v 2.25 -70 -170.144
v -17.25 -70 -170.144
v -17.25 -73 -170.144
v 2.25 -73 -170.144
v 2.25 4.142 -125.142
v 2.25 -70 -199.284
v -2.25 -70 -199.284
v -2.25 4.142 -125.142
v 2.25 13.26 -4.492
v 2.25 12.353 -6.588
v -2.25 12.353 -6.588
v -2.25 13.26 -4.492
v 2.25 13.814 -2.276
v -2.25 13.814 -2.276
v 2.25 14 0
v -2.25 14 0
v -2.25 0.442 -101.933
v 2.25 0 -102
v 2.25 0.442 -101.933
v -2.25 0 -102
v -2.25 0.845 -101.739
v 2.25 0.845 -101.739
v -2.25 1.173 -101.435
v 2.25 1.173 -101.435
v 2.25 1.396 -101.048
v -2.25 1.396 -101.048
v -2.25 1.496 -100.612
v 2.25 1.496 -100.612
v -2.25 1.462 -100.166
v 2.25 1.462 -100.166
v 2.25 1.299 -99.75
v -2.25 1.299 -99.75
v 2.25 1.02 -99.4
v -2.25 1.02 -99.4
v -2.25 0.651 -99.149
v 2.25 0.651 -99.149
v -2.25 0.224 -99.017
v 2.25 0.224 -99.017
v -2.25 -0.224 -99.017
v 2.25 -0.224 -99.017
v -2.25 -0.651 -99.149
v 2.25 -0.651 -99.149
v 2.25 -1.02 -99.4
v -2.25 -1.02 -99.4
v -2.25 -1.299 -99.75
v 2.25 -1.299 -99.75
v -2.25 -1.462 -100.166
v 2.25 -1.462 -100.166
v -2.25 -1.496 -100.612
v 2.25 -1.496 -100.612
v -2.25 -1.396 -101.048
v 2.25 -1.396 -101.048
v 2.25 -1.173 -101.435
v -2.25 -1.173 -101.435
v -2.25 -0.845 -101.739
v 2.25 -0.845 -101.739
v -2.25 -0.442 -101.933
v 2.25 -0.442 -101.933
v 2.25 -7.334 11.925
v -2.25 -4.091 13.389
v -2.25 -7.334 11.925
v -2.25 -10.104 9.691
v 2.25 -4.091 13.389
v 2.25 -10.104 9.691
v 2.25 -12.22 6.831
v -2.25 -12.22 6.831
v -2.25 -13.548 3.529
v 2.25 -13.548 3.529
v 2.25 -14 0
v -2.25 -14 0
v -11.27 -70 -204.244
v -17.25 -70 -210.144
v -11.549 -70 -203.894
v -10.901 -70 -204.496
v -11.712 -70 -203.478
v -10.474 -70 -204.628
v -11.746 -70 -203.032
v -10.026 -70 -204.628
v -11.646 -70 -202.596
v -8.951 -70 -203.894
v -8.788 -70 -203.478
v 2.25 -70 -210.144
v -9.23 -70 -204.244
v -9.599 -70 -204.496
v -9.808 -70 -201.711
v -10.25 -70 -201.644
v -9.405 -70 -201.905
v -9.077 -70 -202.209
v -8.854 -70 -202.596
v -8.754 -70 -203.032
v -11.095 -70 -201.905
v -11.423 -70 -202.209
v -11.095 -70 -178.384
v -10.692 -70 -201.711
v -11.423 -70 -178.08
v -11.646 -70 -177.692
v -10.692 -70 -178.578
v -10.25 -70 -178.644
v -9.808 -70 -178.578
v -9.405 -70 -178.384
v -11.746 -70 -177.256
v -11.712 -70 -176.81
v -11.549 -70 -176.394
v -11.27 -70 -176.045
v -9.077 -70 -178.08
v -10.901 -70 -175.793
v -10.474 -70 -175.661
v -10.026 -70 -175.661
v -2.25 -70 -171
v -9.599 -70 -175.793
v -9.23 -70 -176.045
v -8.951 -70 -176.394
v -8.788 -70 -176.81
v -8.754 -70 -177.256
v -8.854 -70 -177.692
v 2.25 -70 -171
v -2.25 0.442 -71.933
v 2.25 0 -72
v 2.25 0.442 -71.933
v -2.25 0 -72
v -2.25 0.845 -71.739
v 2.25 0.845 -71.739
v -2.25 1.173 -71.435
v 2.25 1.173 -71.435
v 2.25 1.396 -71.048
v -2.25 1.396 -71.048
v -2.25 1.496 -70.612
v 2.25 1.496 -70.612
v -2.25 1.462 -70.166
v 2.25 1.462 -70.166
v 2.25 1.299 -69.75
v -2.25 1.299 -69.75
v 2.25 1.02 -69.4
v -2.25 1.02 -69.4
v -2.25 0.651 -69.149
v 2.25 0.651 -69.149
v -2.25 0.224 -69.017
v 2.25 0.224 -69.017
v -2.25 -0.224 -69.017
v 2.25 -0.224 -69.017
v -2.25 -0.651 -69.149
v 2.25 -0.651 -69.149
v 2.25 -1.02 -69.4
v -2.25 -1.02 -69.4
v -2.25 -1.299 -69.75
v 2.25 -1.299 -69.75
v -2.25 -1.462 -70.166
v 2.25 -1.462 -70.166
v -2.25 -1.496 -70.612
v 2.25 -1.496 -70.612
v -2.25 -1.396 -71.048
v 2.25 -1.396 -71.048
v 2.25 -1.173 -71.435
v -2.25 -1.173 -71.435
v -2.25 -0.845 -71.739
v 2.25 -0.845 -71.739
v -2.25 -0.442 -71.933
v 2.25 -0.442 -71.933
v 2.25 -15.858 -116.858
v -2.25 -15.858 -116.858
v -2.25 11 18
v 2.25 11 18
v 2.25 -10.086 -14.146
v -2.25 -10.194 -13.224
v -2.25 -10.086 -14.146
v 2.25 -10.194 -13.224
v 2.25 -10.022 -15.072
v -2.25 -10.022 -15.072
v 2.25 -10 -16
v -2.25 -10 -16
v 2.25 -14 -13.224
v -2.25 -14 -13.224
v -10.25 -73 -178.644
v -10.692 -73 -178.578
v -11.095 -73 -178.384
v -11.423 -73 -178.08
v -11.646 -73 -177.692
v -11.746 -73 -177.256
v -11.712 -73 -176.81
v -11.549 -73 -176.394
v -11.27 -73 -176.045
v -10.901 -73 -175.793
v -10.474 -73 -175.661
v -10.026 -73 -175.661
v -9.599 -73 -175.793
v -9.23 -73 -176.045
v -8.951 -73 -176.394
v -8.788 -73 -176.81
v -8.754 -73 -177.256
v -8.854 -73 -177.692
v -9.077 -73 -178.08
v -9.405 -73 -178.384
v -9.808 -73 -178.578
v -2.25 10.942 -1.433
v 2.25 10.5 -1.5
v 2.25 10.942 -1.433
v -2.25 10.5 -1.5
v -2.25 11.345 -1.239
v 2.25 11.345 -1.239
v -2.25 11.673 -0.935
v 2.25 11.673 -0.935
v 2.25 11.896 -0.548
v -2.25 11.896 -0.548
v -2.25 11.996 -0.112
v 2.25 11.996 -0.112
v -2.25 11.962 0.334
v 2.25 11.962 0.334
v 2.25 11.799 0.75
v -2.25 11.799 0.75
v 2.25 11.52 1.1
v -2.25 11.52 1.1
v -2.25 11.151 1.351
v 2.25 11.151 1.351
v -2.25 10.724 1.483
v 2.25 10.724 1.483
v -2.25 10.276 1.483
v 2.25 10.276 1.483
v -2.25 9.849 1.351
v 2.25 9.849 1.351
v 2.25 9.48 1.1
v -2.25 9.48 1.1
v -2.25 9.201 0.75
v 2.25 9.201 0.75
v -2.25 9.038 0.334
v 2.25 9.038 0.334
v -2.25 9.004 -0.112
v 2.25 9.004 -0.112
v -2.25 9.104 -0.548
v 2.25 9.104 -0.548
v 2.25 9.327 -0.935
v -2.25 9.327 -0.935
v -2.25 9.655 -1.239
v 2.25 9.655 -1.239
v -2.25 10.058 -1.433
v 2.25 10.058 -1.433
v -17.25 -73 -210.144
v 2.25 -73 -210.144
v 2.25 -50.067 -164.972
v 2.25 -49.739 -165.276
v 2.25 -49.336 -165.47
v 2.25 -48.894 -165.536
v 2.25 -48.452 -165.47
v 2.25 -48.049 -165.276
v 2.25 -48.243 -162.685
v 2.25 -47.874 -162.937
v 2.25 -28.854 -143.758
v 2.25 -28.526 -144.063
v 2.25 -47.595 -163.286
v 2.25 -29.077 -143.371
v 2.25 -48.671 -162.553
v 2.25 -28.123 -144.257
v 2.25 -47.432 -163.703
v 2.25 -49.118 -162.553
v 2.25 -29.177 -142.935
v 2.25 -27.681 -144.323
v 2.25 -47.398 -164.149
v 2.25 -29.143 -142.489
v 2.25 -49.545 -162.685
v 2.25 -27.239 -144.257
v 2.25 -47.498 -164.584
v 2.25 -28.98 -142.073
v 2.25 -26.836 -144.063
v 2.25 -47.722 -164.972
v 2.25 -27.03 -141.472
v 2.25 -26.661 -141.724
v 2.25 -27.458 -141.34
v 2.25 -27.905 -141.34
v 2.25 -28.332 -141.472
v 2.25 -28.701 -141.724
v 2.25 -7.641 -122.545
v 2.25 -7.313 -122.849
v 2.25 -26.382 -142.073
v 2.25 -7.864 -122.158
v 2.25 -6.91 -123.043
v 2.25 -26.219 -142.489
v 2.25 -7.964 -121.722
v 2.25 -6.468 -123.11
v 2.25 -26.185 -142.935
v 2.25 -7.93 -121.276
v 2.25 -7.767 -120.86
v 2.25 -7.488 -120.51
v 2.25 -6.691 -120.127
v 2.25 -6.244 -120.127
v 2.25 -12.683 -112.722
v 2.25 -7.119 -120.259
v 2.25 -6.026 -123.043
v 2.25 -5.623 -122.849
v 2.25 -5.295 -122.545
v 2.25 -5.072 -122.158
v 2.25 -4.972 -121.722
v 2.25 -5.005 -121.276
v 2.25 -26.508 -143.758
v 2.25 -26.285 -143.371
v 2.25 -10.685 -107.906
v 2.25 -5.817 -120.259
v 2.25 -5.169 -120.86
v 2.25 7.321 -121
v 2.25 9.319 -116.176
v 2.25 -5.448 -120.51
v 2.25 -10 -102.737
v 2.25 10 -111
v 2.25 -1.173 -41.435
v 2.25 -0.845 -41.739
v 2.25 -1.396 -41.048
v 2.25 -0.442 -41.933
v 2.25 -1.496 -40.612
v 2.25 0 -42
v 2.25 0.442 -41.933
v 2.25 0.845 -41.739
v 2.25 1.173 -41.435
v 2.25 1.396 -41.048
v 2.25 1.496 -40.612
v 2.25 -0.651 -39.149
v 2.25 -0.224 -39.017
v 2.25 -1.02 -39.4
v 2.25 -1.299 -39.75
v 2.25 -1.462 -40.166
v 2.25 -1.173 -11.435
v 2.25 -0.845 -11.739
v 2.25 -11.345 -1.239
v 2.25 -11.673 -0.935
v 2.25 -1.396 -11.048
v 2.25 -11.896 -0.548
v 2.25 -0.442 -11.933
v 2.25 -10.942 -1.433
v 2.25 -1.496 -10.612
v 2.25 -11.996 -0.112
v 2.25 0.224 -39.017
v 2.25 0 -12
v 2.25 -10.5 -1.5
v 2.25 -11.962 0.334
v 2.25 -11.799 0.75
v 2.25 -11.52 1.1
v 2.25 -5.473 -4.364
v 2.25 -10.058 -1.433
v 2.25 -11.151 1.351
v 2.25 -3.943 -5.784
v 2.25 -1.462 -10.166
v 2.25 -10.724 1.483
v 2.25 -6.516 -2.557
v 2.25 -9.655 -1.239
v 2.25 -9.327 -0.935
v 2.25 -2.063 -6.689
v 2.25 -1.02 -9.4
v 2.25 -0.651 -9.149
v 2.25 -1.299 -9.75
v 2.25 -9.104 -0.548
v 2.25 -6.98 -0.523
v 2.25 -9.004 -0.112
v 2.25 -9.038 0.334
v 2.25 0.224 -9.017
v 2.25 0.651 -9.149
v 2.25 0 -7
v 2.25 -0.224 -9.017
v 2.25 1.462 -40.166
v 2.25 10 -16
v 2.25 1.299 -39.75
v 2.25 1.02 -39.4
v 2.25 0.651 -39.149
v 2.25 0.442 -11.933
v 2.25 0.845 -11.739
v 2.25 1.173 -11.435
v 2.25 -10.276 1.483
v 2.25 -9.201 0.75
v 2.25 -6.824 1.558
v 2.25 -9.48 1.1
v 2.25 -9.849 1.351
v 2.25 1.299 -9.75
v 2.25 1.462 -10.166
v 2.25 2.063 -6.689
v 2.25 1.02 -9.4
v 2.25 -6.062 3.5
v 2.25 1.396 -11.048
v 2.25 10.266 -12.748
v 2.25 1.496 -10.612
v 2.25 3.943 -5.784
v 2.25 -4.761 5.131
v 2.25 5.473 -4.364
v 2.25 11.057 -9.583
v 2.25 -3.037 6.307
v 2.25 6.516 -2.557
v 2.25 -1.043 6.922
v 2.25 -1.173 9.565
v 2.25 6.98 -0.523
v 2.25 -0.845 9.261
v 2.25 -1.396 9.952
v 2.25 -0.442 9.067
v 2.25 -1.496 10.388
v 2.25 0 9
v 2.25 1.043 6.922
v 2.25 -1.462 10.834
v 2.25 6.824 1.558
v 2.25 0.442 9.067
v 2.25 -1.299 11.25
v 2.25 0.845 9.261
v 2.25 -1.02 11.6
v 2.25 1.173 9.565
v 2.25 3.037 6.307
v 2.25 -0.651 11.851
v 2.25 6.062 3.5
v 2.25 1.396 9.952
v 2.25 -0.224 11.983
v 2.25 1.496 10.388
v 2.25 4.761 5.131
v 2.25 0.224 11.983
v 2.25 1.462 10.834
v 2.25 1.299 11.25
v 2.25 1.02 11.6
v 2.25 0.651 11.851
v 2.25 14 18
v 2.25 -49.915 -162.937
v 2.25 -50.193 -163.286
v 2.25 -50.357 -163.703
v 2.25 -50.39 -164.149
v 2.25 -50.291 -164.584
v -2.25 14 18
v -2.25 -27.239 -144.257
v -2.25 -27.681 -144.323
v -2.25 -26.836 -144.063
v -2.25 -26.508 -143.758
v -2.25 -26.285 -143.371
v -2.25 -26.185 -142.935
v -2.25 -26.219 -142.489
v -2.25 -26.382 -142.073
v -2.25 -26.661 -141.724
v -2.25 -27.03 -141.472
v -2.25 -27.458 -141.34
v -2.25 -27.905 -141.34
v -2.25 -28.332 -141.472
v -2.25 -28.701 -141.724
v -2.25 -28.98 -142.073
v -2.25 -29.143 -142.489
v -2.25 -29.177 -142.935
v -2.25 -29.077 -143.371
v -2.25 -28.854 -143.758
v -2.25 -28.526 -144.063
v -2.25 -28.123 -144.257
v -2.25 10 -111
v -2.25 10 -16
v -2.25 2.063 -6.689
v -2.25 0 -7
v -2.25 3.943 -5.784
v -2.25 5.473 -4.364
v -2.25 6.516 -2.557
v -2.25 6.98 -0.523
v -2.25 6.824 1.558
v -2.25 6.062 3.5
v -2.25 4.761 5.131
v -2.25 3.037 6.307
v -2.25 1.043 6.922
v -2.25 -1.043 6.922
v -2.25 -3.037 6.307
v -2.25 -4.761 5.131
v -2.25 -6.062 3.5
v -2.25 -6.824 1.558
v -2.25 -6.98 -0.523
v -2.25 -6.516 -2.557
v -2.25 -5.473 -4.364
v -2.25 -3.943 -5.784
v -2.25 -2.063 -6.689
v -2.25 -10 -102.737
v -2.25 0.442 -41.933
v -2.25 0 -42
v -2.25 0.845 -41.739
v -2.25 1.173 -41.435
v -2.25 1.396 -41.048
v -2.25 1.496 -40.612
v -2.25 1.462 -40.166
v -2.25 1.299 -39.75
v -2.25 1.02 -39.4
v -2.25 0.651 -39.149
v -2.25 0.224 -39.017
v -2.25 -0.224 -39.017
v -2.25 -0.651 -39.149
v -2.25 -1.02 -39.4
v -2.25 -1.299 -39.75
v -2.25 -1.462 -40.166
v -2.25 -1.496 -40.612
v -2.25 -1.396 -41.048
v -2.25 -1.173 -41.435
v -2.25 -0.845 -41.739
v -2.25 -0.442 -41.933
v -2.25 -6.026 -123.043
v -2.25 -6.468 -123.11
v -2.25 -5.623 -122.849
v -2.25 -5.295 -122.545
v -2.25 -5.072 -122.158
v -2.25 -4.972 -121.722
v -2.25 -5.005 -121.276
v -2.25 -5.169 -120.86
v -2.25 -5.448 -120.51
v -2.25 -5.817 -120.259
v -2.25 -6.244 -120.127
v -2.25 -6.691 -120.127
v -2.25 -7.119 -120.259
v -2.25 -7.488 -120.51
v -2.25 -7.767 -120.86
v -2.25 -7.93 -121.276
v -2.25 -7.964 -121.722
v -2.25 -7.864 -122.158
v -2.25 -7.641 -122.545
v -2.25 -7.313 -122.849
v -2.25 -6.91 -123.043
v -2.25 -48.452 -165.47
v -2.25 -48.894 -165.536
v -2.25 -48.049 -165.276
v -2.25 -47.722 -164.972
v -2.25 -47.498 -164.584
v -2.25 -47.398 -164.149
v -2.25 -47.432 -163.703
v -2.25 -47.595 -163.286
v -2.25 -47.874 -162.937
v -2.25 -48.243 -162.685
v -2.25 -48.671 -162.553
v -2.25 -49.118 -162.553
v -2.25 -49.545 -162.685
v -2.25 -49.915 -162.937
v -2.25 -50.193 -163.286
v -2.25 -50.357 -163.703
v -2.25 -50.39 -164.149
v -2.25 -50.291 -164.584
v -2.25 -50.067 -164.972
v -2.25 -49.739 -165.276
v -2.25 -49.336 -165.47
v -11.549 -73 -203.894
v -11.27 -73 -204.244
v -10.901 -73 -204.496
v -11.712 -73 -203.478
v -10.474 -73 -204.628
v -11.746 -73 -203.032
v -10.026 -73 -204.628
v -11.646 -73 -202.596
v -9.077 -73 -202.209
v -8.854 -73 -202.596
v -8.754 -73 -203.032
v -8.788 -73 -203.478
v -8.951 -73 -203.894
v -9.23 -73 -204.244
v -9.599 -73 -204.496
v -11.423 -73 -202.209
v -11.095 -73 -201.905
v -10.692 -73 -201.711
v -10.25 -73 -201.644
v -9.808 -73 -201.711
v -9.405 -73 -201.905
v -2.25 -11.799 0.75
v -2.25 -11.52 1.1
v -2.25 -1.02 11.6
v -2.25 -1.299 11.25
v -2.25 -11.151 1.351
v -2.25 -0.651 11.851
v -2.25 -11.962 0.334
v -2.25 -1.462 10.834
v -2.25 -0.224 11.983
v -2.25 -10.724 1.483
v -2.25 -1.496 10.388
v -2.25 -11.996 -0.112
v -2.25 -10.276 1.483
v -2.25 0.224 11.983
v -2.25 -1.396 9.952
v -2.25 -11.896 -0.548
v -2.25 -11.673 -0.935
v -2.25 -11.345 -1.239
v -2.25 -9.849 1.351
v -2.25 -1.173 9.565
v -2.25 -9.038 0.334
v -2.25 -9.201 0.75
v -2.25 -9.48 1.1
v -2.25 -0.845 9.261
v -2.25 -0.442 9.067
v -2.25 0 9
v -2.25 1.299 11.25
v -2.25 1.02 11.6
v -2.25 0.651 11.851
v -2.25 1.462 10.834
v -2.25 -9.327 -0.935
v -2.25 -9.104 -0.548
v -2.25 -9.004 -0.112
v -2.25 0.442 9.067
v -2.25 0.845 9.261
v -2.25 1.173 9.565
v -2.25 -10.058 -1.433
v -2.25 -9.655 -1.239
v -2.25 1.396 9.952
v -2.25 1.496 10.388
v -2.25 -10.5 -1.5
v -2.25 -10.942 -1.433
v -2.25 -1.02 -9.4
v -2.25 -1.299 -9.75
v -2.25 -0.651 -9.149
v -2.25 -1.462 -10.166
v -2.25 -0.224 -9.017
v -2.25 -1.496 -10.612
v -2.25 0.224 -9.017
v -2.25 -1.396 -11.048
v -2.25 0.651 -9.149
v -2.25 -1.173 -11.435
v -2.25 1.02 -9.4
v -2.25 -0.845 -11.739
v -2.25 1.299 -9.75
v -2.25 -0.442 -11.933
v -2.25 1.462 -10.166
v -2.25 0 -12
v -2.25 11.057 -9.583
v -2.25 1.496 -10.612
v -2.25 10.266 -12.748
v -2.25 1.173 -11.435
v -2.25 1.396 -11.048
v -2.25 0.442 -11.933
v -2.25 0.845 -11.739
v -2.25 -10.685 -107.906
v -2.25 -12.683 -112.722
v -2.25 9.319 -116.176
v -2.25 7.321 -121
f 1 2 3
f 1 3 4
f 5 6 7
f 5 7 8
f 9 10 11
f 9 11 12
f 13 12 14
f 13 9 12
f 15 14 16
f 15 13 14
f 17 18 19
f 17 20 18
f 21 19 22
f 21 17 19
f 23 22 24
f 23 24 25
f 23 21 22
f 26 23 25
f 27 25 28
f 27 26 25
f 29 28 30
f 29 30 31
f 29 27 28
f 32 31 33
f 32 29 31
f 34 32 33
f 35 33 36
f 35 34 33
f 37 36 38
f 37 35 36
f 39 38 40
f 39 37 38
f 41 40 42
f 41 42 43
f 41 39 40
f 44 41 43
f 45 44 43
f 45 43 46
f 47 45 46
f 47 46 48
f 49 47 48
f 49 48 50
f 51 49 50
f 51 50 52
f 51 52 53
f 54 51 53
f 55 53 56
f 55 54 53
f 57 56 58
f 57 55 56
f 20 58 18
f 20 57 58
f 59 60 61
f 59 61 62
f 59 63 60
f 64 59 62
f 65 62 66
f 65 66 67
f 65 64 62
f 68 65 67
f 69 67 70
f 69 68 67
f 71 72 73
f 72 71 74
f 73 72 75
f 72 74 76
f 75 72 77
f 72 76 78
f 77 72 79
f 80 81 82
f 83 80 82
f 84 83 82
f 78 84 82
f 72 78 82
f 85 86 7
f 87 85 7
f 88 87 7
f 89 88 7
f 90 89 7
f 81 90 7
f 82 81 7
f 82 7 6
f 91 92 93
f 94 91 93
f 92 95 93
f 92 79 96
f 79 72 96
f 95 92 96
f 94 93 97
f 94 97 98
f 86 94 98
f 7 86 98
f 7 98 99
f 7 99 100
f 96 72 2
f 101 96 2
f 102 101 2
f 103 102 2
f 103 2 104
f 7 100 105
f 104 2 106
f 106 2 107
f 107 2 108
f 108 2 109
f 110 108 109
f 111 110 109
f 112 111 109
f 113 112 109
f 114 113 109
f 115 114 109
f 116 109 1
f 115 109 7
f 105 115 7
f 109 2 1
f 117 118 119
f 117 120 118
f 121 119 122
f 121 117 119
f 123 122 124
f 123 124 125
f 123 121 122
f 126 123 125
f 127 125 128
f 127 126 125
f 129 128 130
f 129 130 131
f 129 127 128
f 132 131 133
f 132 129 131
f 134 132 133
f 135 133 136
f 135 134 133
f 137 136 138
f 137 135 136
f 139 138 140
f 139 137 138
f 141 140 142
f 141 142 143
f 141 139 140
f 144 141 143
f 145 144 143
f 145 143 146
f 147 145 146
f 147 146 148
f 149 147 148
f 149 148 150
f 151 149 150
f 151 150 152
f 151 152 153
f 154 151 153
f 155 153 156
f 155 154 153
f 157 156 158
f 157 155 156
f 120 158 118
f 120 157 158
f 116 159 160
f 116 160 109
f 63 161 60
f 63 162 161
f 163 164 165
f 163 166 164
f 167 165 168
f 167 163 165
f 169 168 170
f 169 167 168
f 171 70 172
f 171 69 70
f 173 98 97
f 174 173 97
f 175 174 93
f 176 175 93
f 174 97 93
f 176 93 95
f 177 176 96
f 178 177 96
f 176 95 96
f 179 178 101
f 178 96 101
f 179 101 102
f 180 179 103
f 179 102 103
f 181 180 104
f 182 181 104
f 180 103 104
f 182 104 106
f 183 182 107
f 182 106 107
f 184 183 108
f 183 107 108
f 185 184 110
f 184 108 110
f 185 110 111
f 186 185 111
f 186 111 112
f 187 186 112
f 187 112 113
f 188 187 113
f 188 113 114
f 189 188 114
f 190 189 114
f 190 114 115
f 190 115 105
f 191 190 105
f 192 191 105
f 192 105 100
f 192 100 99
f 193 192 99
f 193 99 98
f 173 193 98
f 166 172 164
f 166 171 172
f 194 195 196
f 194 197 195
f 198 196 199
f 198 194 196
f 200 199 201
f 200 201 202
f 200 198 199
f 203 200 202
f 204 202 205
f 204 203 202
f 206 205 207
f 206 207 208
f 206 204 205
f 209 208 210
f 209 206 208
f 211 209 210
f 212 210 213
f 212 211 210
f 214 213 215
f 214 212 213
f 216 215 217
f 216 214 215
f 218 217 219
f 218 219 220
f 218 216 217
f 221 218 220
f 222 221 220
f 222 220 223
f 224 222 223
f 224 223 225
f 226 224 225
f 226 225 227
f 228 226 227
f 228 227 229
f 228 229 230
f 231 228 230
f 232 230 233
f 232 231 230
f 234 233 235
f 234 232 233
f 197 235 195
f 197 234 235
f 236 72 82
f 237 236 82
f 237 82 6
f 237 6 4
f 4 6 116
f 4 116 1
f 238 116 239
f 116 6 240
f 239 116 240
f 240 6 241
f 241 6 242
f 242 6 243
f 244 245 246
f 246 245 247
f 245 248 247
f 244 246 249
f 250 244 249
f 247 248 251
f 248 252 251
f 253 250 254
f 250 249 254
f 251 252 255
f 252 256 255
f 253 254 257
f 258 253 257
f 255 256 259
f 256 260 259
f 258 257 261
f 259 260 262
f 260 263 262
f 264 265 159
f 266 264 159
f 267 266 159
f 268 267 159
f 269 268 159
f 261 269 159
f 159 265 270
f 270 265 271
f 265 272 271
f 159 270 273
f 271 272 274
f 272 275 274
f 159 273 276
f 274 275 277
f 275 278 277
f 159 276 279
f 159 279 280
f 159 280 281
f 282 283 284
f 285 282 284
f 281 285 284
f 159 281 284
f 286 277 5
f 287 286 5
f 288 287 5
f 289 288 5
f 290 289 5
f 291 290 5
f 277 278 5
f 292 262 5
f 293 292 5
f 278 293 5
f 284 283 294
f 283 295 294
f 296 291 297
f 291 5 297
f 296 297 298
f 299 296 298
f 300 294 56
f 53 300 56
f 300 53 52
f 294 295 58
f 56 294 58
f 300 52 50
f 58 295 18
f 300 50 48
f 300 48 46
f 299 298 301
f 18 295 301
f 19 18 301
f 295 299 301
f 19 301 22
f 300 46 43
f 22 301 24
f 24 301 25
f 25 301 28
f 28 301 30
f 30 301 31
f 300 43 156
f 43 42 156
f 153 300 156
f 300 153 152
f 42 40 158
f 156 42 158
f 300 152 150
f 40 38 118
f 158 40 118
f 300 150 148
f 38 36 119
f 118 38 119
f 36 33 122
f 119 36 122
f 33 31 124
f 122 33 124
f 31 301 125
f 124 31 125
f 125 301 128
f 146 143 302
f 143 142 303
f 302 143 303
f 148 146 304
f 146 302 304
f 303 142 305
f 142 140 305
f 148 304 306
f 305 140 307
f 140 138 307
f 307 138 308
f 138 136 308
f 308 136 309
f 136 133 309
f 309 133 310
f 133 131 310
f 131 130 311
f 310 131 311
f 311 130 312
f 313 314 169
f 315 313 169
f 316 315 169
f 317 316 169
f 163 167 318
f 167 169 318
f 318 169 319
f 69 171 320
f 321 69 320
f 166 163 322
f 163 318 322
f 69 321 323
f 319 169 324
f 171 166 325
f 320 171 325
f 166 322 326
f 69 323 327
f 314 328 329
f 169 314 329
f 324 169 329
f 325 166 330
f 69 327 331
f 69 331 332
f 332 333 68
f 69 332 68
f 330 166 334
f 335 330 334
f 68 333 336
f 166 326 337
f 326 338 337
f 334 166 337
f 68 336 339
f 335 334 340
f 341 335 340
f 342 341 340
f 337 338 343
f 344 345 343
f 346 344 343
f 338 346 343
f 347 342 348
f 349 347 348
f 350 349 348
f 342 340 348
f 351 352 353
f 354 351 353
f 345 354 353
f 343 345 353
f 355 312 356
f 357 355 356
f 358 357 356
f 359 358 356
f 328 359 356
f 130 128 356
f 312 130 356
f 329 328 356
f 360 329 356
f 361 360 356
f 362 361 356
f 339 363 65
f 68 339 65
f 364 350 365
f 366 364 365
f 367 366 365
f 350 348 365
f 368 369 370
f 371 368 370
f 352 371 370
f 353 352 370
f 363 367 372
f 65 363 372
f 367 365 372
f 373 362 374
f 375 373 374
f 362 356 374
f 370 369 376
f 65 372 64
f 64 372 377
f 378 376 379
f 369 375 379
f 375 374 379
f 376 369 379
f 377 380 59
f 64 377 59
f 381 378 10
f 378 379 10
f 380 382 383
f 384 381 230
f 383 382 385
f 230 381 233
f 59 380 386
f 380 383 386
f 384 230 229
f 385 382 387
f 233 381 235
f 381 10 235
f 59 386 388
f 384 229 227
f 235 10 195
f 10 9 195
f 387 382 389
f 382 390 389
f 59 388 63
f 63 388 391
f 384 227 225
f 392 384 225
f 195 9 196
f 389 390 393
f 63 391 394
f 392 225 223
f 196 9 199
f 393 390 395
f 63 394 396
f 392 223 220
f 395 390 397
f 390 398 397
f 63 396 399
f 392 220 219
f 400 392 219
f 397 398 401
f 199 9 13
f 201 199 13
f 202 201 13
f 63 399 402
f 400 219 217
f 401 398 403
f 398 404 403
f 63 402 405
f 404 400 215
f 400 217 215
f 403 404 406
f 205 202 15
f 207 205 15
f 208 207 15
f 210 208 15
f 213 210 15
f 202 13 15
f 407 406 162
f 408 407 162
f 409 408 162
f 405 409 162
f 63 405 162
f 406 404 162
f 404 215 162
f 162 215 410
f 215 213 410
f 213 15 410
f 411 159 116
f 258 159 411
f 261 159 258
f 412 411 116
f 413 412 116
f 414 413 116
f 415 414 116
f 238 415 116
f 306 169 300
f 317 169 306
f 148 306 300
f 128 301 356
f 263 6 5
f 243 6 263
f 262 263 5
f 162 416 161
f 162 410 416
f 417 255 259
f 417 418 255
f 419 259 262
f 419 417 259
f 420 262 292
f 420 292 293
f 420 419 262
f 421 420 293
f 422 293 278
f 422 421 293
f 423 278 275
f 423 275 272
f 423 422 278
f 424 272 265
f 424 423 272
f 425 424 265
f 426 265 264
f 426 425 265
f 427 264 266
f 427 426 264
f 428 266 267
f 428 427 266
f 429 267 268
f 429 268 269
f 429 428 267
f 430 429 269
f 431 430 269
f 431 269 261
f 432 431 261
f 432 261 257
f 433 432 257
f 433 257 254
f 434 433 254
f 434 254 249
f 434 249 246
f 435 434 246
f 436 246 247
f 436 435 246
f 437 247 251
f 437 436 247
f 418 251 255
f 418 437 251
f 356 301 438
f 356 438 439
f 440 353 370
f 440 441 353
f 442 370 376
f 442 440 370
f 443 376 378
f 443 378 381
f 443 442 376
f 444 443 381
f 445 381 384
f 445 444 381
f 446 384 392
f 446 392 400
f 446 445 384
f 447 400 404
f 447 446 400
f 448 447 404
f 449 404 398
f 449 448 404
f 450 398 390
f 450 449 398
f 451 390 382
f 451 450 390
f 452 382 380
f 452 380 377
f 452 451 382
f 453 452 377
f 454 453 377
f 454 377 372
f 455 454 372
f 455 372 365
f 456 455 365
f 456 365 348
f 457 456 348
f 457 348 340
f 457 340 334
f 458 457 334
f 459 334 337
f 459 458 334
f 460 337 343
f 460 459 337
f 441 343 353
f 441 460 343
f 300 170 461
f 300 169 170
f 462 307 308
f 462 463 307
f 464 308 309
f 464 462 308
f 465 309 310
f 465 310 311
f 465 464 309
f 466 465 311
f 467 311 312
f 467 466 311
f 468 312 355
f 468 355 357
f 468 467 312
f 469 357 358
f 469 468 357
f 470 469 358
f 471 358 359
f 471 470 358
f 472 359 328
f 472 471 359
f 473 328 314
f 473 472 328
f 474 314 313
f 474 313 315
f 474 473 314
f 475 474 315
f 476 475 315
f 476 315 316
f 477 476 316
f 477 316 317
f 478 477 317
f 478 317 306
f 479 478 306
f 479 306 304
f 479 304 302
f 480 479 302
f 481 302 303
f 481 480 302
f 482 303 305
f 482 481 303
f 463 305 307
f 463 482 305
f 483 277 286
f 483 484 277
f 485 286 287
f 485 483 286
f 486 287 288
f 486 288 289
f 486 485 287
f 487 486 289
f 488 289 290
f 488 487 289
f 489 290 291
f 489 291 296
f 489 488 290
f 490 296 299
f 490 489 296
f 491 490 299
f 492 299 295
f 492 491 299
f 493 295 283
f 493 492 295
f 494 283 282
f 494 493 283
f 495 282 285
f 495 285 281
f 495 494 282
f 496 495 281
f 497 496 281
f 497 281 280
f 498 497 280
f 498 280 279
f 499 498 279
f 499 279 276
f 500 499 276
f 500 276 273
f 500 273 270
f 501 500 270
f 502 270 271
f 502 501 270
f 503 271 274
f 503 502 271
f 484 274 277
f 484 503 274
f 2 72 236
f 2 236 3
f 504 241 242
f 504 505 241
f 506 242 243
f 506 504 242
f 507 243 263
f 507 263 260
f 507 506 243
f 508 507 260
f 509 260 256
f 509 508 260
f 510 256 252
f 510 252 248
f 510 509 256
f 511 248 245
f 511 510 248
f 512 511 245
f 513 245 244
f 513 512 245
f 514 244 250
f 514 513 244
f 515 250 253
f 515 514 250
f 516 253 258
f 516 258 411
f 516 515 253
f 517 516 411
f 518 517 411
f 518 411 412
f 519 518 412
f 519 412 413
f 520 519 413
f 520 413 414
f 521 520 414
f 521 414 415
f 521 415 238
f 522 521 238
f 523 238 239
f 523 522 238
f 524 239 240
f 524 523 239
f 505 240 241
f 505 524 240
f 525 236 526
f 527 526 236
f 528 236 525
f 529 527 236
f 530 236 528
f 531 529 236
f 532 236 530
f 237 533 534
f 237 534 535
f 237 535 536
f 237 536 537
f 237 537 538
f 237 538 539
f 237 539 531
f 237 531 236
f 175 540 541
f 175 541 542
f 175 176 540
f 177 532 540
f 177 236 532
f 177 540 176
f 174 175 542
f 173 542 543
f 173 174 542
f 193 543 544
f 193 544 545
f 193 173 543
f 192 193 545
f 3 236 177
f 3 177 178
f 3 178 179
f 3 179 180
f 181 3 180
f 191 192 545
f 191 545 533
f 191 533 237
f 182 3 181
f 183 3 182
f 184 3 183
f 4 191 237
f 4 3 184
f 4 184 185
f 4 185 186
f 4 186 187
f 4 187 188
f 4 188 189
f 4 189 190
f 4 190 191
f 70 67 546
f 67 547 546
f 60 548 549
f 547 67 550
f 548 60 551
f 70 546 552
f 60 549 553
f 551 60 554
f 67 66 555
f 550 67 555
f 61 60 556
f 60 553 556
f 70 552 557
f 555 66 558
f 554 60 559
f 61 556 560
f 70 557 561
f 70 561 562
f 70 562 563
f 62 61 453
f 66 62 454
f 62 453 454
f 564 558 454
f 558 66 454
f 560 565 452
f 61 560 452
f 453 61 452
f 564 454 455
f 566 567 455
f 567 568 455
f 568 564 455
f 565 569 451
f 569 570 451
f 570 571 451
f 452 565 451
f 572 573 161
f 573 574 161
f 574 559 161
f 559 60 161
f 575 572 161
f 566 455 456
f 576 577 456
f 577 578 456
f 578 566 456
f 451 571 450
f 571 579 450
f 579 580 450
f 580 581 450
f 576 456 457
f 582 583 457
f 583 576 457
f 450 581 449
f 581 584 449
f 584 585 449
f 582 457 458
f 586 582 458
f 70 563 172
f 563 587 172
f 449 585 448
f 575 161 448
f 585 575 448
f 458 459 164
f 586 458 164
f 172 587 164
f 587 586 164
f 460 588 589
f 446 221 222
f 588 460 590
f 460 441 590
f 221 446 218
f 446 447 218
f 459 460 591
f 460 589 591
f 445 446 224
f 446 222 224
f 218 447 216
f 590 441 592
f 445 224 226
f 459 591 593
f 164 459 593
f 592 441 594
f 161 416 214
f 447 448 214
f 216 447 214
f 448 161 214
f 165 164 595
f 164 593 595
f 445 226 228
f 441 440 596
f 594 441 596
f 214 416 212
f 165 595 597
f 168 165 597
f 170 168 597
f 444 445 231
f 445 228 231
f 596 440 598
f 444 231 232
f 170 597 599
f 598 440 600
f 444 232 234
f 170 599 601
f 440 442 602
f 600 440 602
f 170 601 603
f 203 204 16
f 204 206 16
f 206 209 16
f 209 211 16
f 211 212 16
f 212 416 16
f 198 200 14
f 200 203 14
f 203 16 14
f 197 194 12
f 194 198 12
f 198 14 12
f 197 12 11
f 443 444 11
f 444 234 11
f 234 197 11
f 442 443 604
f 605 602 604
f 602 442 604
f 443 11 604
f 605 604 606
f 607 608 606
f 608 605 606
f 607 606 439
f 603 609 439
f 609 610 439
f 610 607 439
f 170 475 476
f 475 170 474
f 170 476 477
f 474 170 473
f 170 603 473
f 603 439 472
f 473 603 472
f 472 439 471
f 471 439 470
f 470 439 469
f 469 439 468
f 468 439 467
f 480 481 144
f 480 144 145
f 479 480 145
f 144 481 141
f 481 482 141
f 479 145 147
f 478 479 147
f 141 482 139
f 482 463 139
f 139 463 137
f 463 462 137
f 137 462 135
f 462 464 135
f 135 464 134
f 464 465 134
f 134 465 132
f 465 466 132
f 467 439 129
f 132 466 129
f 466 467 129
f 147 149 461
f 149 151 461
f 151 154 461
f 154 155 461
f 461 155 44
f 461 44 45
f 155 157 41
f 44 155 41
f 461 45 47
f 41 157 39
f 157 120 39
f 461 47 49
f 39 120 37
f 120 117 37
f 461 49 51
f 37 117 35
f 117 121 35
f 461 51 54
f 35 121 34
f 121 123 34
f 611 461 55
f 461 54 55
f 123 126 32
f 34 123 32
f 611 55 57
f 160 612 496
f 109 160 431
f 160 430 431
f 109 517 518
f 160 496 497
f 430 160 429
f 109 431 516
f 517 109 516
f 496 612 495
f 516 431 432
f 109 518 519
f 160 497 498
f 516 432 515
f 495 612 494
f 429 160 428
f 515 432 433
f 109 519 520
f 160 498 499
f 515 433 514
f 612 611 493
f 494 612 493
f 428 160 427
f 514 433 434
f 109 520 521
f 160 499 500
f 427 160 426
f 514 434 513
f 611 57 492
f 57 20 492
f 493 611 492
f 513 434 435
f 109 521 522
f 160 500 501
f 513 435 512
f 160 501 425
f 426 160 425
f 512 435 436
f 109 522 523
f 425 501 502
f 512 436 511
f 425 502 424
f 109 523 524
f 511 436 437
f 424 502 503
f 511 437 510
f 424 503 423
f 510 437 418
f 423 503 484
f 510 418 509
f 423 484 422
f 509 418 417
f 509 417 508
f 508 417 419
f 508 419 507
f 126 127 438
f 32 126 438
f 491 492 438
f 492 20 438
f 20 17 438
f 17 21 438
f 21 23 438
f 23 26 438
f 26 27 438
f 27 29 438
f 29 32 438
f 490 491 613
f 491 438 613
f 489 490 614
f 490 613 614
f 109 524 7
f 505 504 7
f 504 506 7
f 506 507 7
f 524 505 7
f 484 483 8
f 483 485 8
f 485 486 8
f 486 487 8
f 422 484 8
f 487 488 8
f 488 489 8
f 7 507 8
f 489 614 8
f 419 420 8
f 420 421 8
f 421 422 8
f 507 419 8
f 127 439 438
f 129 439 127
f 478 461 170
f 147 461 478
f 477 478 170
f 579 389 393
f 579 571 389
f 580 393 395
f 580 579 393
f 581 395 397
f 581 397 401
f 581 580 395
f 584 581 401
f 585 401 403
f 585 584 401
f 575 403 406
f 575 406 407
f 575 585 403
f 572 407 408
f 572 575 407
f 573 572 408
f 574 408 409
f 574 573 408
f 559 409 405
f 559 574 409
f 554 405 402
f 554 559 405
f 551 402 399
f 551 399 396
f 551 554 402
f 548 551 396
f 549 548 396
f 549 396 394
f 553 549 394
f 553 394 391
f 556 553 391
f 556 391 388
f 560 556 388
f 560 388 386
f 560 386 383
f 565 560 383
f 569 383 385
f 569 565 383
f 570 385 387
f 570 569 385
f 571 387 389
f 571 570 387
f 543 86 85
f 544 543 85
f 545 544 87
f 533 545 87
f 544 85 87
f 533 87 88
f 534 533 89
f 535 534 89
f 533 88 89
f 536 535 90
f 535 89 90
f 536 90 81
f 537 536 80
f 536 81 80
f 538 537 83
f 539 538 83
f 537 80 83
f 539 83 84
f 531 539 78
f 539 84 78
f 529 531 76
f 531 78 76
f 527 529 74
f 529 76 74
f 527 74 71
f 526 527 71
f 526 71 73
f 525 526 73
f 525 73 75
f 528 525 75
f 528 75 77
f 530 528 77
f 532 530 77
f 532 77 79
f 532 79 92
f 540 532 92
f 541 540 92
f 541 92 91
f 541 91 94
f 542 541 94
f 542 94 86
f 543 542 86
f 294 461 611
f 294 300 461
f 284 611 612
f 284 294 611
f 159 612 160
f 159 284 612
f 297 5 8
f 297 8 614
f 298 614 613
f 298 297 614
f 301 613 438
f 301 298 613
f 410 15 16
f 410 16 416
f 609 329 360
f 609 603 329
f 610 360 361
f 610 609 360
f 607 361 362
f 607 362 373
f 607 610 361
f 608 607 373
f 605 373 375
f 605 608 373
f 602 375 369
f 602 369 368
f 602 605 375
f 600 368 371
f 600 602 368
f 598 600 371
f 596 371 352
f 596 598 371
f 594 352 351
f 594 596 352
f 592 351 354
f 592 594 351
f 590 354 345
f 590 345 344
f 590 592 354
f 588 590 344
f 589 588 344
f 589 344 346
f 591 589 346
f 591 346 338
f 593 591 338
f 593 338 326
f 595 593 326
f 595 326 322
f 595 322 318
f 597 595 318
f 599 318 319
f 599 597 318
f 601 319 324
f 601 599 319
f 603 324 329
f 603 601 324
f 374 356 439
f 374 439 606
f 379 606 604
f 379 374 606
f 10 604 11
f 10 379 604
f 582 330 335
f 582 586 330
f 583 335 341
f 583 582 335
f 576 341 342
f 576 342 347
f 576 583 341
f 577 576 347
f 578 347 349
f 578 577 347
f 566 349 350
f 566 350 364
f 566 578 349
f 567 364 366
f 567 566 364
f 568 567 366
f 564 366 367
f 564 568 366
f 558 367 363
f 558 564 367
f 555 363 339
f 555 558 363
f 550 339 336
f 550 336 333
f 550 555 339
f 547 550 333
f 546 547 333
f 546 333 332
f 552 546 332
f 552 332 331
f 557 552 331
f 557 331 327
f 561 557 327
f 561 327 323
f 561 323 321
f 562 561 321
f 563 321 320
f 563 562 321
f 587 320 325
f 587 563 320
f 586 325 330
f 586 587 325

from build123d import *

# Parameters (mm, degrees)
SKETCH_1_R          = 1.5
SKETCH_1_R_2        = 7
EXTRUDE_1_DEPTH     = 2.25
SKETCH_3_W          = 19.5
SKETCH_3_H          = 40
EXTRUDE_2_DEPTH     = 3
SKETCH_4_R          = 1.5
CUT_EXTRUDE_1_DEPTH = 227.967348396


with BuildPart() as part:
    # 草图1 → 凸台-拉伸1 (new, symmetric)
    with BuildSketch(Plane(origin=(0, 0, 0), x_dir=(0, 0, -1), z_dir=(1, 0, 0))):
        with BuildLine():
            ThreePointArc((102.736907967, -10), (110.379173808, -11.526455333), (116.85785315, -15.85785315))
            Line((116.85785315, -15.85785315), (171, -70))
            Line((171, -70), (199.284271247, -70))
            Line((199.284271247, -70), (125.142135624, 4.142135624))
            ThreePointArc((125.142135624, 4.142135624), (118.653668647, 8.47759065), (111, 10))
            Line((111, 10), (16, 10))
            ThreePointArc((16, 10), (11.149287499, 10.597149997), (6.588235294, 12.352941176))
            ThreePointArc((6.588235294, 12.352941176), (3.395498751, 13.581995002), (0, 14))
            Line((0, 14), (-18, 14))
            Line((-18, 14), (-18, 11))
            Line((-18, 11), (-13.388941598, -4.090995342))
            ThreePointArc((-13.388941598, -4.090995342), (-8.328447191, -11.253309175), (0, -14))
            Line((0, -14), (13.224243357, -14))
            Line((13.224243357, -14), (13.224243357, -10.193557234))
            ThreePointArc((13.224243357, -10.193557234), (14.608751519, -10.048447989), (16, -10))
            Line((16, -10), (102.736907967, -10))
        make_face()
        with Locations((164.036406871, -48.894271247)):
            Circle(SKETCH_1_R, mode=Mode.SUBTRACT)
        with Locations((142.823203436, -27.681067812)):
            Circle(SKETCH_1_R, mode=Mode.SUBTRACT)
        with Locations((0, -10.5)):
            Circle(SKETCH_1_R, mode=Mode.SUBTRACT)
        with Locations((-10.5, 0)):
            Circle(SKETCH_1_R, mode=Mode.SUBTRACT)
        Circle(SKETCH_1_R_2, mode=Mode.SUBTRACT)
        with Locations((10.5, 0)):
            Circle(SKETCH_1_R, mode=Mode.SUBTRACT)
        with Locations((0, 10.5)):
            Circle(SKETCH_1_R, mode=Mode.SUBTRACT)
        with Locations((40.5, 0)):
            Circle(SKETCH_1_R, mode=Mode.SUBTRACT)
        with Locations((70.5, 0)):
            Circle(SKETCH_1_R, mode=Mode.SUBTRACT)
        with Locations((121.61, -6.467864376)):
            Circle(SKETCH_1_R, mode=Mode.SUBTRACT)
        with Locations((100.5, 0)):
            Circle(SKETCH_1_R, mode=Mode.SUBTRACT)
    extrude(amount=EXTRUDE_1_DEPTH, both=True)

    # 草图3 → 凸台-拉伸2 (add)
    with BuildSketch(Plane.XZ.offset(70)):
        with Locations((-7.5, -190.144271247)):
            Rectangle(SKETCH_3_W, SKETCH_3_H)
    extrude(amount=EXTRUDE_2_DEPTH)

    # 草图4 → 切除-拉伸1 (cut, through all)
    with BuildSketch(Plane(origin=(0, -70, 0), x_dir=(1, 0, 0), z_dir=(0, 1, 0))):
        with Locations(Location((-10.25, 203.144271247, 0), (0, 0, 270))):
            Circle(SKETCH_4_R)
        with Locations(Location((-10.25, 177.144271247, 0), (0, 0, 90))):
            Circle(SKETCH_4_R)
    extrude(amount=-CUT_EXTRUDE_1_DEPTH, mode=Mode.SUBTRACT)


solid = part.part
